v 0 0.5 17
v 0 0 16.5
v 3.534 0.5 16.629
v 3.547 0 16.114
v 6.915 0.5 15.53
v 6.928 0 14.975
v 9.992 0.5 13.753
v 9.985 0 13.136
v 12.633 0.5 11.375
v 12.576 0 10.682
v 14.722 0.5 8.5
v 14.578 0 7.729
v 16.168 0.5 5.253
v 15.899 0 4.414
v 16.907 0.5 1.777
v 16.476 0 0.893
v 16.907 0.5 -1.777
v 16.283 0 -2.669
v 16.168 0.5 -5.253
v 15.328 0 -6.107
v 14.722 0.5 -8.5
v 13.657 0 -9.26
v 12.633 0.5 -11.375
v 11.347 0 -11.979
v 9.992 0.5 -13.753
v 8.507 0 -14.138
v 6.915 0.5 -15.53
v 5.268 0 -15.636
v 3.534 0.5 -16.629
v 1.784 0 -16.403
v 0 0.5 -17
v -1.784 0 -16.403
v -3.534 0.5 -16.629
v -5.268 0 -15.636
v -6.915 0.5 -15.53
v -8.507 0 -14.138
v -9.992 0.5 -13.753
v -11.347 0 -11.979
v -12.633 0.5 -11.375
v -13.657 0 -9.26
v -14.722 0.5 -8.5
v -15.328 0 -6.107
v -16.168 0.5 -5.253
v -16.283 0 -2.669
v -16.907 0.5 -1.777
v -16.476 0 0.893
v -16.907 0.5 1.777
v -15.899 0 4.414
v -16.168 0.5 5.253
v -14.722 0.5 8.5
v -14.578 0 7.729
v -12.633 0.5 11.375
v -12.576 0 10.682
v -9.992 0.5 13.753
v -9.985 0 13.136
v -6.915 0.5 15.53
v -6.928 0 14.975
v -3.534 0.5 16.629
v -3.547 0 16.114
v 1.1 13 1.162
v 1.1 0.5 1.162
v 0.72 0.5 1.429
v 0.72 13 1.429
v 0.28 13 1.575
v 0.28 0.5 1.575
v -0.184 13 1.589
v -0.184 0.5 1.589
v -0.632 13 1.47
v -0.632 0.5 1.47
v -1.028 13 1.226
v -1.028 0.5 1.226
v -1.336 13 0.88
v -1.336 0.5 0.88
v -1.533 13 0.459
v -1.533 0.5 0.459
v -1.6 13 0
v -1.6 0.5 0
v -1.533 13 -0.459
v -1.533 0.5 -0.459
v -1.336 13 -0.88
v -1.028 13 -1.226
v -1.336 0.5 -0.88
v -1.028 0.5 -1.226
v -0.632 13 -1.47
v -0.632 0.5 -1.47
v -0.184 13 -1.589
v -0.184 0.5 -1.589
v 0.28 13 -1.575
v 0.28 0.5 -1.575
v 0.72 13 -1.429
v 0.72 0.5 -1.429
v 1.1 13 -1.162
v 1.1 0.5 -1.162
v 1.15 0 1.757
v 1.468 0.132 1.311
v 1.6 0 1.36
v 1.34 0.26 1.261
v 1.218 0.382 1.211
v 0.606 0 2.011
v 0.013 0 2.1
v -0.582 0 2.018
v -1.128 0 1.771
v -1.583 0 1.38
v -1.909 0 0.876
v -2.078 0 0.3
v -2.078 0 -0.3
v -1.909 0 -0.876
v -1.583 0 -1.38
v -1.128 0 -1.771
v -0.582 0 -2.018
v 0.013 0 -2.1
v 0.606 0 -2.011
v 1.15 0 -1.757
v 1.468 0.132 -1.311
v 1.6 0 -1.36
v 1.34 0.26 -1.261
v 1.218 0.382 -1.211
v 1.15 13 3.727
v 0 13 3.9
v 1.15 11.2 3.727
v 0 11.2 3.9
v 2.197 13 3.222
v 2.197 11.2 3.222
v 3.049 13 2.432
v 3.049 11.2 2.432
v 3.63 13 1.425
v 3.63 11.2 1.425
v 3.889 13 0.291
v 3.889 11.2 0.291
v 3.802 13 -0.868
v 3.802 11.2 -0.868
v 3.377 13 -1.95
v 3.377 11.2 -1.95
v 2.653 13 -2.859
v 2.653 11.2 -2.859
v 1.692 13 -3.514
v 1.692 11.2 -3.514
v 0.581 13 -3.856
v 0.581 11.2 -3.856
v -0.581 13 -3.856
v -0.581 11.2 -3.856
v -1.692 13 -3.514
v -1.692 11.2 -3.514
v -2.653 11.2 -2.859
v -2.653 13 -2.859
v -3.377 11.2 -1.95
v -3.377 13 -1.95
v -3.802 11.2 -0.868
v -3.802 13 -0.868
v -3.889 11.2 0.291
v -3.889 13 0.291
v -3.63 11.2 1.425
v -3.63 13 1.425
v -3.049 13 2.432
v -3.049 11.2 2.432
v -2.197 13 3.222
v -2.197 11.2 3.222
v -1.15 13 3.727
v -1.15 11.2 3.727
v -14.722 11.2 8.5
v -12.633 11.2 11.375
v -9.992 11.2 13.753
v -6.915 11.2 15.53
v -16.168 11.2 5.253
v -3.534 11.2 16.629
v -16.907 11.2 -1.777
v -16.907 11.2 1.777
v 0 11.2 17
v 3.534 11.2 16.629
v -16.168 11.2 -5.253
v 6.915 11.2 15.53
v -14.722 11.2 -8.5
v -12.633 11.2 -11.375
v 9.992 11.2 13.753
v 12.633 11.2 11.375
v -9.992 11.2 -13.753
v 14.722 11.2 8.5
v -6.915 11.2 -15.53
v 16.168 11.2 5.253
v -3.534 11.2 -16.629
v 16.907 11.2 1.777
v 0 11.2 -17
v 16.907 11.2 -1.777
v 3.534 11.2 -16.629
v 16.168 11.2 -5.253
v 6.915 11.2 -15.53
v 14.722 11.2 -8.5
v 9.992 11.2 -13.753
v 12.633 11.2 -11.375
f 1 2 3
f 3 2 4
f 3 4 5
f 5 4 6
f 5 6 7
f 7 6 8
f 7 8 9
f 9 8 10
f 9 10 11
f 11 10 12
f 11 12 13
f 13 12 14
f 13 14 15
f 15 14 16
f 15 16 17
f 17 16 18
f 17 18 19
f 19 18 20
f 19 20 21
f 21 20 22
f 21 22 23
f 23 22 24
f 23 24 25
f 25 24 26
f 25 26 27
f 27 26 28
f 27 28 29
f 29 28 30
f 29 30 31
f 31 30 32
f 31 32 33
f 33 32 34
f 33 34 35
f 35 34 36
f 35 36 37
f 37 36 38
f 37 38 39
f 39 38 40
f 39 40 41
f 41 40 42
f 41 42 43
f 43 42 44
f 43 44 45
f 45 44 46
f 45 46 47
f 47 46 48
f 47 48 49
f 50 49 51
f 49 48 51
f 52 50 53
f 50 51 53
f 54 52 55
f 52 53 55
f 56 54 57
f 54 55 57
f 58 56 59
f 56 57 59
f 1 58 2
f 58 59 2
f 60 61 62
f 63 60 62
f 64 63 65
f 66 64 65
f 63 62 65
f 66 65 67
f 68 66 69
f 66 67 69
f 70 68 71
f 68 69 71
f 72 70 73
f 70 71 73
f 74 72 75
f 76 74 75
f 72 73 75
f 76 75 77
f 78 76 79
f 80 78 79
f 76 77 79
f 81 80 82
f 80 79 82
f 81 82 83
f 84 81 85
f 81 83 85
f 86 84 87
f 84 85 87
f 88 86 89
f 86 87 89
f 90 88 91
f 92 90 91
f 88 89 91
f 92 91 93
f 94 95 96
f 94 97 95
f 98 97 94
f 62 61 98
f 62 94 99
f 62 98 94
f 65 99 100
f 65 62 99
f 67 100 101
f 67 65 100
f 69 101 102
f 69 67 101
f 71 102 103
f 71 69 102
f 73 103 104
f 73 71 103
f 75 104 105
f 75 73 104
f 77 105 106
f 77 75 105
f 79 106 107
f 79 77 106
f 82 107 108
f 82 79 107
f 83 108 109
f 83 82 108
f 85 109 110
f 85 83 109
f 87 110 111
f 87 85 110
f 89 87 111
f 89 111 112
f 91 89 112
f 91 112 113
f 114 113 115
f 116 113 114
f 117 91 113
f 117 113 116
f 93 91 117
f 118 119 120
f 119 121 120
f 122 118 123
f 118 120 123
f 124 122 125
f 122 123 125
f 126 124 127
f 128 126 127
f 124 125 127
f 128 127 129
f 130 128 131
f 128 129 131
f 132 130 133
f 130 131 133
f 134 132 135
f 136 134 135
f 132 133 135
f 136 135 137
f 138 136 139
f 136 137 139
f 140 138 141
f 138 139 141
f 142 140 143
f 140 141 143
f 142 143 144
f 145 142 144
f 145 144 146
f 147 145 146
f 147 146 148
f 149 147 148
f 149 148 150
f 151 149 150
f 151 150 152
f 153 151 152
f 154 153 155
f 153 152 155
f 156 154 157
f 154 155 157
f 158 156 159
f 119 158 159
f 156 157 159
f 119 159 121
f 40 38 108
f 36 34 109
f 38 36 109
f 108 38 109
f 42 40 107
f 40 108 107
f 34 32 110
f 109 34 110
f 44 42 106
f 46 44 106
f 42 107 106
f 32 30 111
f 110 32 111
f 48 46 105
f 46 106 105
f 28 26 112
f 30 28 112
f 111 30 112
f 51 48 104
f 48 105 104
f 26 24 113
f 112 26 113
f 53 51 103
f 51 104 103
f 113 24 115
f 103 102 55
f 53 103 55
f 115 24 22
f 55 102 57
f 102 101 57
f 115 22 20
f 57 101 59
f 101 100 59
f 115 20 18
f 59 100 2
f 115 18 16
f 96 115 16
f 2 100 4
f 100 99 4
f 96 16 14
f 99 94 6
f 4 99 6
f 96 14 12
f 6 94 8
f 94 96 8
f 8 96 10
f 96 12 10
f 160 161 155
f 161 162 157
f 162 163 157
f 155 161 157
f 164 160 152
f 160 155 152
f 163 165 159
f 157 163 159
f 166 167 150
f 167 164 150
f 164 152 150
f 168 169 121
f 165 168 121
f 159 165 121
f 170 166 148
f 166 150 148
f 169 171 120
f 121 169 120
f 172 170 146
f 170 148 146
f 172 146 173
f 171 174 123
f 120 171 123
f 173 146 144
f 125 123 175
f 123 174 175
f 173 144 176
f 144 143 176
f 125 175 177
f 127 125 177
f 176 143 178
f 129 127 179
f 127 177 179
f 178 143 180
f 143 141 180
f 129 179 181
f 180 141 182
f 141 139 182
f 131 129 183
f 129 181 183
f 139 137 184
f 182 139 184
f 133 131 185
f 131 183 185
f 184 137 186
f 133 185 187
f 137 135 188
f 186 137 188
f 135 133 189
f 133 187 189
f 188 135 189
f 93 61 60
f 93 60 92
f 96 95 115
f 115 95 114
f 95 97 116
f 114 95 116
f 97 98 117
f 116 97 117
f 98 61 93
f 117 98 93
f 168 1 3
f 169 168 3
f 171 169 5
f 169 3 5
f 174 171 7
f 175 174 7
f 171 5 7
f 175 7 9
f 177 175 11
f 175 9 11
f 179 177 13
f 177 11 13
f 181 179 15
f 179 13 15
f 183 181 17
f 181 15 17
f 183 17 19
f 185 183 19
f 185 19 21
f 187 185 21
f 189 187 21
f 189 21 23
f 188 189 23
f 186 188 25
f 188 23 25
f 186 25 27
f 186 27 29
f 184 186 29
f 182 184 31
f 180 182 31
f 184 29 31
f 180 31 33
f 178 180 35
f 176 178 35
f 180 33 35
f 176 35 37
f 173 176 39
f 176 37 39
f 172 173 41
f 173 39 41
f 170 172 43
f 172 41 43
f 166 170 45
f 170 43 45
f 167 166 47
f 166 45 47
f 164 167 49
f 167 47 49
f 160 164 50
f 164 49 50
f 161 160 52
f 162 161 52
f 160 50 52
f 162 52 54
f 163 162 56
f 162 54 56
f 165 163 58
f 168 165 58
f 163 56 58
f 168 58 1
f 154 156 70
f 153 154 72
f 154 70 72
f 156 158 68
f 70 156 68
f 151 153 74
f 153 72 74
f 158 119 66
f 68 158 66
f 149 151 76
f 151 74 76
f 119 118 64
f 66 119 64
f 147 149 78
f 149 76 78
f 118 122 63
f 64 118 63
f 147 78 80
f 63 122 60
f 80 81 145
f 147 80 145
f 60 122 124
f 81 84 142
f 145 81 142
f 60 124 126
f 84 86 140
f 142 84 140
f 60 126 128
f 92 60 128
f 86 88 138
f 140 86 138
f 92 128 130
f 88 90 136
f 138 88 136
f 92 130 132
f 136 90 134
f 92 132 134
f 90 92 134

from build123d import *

# Parameters (mm, degrees)
POCKET_DEPTH = 13.001
CHAMFER_SIZE = 0.5


with BuildPart() as part:
    # Sketch → Revolution (revolve)
    with BuildSketch(Plane.YZ):
        Polygon((11.2, 17), (0, 17), (0, 0), (13, 0), (13, 3.9), (11.2, 3.9), align=None)
    revolve(axis=Axis((0, 0, 0), (0, 1, 0)))

    # Sketch001 → Pocket (cut, through all)
    with BuildSketch(Plane.XZ):
        with BuildLine():
            ThreePointArc((1.1, 1.161895), (-1.6, 0), (1.1, -1.161895))
            Line((1.1, 1.161895), (1.1, -1.161895))
        make_face()
    extrude(amount=-POCKET_DEPTH, mode=Mode.SUBTRACT)

    # Chamfer
    chamfer_edges = [part.edges().sort_by_distance(p)[0] for p in [
        (0, 0, -17),
        (1.1, 0, 0),
        (-1.6, 0, 0),
    ]]
    chamfer(chamfer_edges, length=CHAMFER_SIZE)


solid = part.part
